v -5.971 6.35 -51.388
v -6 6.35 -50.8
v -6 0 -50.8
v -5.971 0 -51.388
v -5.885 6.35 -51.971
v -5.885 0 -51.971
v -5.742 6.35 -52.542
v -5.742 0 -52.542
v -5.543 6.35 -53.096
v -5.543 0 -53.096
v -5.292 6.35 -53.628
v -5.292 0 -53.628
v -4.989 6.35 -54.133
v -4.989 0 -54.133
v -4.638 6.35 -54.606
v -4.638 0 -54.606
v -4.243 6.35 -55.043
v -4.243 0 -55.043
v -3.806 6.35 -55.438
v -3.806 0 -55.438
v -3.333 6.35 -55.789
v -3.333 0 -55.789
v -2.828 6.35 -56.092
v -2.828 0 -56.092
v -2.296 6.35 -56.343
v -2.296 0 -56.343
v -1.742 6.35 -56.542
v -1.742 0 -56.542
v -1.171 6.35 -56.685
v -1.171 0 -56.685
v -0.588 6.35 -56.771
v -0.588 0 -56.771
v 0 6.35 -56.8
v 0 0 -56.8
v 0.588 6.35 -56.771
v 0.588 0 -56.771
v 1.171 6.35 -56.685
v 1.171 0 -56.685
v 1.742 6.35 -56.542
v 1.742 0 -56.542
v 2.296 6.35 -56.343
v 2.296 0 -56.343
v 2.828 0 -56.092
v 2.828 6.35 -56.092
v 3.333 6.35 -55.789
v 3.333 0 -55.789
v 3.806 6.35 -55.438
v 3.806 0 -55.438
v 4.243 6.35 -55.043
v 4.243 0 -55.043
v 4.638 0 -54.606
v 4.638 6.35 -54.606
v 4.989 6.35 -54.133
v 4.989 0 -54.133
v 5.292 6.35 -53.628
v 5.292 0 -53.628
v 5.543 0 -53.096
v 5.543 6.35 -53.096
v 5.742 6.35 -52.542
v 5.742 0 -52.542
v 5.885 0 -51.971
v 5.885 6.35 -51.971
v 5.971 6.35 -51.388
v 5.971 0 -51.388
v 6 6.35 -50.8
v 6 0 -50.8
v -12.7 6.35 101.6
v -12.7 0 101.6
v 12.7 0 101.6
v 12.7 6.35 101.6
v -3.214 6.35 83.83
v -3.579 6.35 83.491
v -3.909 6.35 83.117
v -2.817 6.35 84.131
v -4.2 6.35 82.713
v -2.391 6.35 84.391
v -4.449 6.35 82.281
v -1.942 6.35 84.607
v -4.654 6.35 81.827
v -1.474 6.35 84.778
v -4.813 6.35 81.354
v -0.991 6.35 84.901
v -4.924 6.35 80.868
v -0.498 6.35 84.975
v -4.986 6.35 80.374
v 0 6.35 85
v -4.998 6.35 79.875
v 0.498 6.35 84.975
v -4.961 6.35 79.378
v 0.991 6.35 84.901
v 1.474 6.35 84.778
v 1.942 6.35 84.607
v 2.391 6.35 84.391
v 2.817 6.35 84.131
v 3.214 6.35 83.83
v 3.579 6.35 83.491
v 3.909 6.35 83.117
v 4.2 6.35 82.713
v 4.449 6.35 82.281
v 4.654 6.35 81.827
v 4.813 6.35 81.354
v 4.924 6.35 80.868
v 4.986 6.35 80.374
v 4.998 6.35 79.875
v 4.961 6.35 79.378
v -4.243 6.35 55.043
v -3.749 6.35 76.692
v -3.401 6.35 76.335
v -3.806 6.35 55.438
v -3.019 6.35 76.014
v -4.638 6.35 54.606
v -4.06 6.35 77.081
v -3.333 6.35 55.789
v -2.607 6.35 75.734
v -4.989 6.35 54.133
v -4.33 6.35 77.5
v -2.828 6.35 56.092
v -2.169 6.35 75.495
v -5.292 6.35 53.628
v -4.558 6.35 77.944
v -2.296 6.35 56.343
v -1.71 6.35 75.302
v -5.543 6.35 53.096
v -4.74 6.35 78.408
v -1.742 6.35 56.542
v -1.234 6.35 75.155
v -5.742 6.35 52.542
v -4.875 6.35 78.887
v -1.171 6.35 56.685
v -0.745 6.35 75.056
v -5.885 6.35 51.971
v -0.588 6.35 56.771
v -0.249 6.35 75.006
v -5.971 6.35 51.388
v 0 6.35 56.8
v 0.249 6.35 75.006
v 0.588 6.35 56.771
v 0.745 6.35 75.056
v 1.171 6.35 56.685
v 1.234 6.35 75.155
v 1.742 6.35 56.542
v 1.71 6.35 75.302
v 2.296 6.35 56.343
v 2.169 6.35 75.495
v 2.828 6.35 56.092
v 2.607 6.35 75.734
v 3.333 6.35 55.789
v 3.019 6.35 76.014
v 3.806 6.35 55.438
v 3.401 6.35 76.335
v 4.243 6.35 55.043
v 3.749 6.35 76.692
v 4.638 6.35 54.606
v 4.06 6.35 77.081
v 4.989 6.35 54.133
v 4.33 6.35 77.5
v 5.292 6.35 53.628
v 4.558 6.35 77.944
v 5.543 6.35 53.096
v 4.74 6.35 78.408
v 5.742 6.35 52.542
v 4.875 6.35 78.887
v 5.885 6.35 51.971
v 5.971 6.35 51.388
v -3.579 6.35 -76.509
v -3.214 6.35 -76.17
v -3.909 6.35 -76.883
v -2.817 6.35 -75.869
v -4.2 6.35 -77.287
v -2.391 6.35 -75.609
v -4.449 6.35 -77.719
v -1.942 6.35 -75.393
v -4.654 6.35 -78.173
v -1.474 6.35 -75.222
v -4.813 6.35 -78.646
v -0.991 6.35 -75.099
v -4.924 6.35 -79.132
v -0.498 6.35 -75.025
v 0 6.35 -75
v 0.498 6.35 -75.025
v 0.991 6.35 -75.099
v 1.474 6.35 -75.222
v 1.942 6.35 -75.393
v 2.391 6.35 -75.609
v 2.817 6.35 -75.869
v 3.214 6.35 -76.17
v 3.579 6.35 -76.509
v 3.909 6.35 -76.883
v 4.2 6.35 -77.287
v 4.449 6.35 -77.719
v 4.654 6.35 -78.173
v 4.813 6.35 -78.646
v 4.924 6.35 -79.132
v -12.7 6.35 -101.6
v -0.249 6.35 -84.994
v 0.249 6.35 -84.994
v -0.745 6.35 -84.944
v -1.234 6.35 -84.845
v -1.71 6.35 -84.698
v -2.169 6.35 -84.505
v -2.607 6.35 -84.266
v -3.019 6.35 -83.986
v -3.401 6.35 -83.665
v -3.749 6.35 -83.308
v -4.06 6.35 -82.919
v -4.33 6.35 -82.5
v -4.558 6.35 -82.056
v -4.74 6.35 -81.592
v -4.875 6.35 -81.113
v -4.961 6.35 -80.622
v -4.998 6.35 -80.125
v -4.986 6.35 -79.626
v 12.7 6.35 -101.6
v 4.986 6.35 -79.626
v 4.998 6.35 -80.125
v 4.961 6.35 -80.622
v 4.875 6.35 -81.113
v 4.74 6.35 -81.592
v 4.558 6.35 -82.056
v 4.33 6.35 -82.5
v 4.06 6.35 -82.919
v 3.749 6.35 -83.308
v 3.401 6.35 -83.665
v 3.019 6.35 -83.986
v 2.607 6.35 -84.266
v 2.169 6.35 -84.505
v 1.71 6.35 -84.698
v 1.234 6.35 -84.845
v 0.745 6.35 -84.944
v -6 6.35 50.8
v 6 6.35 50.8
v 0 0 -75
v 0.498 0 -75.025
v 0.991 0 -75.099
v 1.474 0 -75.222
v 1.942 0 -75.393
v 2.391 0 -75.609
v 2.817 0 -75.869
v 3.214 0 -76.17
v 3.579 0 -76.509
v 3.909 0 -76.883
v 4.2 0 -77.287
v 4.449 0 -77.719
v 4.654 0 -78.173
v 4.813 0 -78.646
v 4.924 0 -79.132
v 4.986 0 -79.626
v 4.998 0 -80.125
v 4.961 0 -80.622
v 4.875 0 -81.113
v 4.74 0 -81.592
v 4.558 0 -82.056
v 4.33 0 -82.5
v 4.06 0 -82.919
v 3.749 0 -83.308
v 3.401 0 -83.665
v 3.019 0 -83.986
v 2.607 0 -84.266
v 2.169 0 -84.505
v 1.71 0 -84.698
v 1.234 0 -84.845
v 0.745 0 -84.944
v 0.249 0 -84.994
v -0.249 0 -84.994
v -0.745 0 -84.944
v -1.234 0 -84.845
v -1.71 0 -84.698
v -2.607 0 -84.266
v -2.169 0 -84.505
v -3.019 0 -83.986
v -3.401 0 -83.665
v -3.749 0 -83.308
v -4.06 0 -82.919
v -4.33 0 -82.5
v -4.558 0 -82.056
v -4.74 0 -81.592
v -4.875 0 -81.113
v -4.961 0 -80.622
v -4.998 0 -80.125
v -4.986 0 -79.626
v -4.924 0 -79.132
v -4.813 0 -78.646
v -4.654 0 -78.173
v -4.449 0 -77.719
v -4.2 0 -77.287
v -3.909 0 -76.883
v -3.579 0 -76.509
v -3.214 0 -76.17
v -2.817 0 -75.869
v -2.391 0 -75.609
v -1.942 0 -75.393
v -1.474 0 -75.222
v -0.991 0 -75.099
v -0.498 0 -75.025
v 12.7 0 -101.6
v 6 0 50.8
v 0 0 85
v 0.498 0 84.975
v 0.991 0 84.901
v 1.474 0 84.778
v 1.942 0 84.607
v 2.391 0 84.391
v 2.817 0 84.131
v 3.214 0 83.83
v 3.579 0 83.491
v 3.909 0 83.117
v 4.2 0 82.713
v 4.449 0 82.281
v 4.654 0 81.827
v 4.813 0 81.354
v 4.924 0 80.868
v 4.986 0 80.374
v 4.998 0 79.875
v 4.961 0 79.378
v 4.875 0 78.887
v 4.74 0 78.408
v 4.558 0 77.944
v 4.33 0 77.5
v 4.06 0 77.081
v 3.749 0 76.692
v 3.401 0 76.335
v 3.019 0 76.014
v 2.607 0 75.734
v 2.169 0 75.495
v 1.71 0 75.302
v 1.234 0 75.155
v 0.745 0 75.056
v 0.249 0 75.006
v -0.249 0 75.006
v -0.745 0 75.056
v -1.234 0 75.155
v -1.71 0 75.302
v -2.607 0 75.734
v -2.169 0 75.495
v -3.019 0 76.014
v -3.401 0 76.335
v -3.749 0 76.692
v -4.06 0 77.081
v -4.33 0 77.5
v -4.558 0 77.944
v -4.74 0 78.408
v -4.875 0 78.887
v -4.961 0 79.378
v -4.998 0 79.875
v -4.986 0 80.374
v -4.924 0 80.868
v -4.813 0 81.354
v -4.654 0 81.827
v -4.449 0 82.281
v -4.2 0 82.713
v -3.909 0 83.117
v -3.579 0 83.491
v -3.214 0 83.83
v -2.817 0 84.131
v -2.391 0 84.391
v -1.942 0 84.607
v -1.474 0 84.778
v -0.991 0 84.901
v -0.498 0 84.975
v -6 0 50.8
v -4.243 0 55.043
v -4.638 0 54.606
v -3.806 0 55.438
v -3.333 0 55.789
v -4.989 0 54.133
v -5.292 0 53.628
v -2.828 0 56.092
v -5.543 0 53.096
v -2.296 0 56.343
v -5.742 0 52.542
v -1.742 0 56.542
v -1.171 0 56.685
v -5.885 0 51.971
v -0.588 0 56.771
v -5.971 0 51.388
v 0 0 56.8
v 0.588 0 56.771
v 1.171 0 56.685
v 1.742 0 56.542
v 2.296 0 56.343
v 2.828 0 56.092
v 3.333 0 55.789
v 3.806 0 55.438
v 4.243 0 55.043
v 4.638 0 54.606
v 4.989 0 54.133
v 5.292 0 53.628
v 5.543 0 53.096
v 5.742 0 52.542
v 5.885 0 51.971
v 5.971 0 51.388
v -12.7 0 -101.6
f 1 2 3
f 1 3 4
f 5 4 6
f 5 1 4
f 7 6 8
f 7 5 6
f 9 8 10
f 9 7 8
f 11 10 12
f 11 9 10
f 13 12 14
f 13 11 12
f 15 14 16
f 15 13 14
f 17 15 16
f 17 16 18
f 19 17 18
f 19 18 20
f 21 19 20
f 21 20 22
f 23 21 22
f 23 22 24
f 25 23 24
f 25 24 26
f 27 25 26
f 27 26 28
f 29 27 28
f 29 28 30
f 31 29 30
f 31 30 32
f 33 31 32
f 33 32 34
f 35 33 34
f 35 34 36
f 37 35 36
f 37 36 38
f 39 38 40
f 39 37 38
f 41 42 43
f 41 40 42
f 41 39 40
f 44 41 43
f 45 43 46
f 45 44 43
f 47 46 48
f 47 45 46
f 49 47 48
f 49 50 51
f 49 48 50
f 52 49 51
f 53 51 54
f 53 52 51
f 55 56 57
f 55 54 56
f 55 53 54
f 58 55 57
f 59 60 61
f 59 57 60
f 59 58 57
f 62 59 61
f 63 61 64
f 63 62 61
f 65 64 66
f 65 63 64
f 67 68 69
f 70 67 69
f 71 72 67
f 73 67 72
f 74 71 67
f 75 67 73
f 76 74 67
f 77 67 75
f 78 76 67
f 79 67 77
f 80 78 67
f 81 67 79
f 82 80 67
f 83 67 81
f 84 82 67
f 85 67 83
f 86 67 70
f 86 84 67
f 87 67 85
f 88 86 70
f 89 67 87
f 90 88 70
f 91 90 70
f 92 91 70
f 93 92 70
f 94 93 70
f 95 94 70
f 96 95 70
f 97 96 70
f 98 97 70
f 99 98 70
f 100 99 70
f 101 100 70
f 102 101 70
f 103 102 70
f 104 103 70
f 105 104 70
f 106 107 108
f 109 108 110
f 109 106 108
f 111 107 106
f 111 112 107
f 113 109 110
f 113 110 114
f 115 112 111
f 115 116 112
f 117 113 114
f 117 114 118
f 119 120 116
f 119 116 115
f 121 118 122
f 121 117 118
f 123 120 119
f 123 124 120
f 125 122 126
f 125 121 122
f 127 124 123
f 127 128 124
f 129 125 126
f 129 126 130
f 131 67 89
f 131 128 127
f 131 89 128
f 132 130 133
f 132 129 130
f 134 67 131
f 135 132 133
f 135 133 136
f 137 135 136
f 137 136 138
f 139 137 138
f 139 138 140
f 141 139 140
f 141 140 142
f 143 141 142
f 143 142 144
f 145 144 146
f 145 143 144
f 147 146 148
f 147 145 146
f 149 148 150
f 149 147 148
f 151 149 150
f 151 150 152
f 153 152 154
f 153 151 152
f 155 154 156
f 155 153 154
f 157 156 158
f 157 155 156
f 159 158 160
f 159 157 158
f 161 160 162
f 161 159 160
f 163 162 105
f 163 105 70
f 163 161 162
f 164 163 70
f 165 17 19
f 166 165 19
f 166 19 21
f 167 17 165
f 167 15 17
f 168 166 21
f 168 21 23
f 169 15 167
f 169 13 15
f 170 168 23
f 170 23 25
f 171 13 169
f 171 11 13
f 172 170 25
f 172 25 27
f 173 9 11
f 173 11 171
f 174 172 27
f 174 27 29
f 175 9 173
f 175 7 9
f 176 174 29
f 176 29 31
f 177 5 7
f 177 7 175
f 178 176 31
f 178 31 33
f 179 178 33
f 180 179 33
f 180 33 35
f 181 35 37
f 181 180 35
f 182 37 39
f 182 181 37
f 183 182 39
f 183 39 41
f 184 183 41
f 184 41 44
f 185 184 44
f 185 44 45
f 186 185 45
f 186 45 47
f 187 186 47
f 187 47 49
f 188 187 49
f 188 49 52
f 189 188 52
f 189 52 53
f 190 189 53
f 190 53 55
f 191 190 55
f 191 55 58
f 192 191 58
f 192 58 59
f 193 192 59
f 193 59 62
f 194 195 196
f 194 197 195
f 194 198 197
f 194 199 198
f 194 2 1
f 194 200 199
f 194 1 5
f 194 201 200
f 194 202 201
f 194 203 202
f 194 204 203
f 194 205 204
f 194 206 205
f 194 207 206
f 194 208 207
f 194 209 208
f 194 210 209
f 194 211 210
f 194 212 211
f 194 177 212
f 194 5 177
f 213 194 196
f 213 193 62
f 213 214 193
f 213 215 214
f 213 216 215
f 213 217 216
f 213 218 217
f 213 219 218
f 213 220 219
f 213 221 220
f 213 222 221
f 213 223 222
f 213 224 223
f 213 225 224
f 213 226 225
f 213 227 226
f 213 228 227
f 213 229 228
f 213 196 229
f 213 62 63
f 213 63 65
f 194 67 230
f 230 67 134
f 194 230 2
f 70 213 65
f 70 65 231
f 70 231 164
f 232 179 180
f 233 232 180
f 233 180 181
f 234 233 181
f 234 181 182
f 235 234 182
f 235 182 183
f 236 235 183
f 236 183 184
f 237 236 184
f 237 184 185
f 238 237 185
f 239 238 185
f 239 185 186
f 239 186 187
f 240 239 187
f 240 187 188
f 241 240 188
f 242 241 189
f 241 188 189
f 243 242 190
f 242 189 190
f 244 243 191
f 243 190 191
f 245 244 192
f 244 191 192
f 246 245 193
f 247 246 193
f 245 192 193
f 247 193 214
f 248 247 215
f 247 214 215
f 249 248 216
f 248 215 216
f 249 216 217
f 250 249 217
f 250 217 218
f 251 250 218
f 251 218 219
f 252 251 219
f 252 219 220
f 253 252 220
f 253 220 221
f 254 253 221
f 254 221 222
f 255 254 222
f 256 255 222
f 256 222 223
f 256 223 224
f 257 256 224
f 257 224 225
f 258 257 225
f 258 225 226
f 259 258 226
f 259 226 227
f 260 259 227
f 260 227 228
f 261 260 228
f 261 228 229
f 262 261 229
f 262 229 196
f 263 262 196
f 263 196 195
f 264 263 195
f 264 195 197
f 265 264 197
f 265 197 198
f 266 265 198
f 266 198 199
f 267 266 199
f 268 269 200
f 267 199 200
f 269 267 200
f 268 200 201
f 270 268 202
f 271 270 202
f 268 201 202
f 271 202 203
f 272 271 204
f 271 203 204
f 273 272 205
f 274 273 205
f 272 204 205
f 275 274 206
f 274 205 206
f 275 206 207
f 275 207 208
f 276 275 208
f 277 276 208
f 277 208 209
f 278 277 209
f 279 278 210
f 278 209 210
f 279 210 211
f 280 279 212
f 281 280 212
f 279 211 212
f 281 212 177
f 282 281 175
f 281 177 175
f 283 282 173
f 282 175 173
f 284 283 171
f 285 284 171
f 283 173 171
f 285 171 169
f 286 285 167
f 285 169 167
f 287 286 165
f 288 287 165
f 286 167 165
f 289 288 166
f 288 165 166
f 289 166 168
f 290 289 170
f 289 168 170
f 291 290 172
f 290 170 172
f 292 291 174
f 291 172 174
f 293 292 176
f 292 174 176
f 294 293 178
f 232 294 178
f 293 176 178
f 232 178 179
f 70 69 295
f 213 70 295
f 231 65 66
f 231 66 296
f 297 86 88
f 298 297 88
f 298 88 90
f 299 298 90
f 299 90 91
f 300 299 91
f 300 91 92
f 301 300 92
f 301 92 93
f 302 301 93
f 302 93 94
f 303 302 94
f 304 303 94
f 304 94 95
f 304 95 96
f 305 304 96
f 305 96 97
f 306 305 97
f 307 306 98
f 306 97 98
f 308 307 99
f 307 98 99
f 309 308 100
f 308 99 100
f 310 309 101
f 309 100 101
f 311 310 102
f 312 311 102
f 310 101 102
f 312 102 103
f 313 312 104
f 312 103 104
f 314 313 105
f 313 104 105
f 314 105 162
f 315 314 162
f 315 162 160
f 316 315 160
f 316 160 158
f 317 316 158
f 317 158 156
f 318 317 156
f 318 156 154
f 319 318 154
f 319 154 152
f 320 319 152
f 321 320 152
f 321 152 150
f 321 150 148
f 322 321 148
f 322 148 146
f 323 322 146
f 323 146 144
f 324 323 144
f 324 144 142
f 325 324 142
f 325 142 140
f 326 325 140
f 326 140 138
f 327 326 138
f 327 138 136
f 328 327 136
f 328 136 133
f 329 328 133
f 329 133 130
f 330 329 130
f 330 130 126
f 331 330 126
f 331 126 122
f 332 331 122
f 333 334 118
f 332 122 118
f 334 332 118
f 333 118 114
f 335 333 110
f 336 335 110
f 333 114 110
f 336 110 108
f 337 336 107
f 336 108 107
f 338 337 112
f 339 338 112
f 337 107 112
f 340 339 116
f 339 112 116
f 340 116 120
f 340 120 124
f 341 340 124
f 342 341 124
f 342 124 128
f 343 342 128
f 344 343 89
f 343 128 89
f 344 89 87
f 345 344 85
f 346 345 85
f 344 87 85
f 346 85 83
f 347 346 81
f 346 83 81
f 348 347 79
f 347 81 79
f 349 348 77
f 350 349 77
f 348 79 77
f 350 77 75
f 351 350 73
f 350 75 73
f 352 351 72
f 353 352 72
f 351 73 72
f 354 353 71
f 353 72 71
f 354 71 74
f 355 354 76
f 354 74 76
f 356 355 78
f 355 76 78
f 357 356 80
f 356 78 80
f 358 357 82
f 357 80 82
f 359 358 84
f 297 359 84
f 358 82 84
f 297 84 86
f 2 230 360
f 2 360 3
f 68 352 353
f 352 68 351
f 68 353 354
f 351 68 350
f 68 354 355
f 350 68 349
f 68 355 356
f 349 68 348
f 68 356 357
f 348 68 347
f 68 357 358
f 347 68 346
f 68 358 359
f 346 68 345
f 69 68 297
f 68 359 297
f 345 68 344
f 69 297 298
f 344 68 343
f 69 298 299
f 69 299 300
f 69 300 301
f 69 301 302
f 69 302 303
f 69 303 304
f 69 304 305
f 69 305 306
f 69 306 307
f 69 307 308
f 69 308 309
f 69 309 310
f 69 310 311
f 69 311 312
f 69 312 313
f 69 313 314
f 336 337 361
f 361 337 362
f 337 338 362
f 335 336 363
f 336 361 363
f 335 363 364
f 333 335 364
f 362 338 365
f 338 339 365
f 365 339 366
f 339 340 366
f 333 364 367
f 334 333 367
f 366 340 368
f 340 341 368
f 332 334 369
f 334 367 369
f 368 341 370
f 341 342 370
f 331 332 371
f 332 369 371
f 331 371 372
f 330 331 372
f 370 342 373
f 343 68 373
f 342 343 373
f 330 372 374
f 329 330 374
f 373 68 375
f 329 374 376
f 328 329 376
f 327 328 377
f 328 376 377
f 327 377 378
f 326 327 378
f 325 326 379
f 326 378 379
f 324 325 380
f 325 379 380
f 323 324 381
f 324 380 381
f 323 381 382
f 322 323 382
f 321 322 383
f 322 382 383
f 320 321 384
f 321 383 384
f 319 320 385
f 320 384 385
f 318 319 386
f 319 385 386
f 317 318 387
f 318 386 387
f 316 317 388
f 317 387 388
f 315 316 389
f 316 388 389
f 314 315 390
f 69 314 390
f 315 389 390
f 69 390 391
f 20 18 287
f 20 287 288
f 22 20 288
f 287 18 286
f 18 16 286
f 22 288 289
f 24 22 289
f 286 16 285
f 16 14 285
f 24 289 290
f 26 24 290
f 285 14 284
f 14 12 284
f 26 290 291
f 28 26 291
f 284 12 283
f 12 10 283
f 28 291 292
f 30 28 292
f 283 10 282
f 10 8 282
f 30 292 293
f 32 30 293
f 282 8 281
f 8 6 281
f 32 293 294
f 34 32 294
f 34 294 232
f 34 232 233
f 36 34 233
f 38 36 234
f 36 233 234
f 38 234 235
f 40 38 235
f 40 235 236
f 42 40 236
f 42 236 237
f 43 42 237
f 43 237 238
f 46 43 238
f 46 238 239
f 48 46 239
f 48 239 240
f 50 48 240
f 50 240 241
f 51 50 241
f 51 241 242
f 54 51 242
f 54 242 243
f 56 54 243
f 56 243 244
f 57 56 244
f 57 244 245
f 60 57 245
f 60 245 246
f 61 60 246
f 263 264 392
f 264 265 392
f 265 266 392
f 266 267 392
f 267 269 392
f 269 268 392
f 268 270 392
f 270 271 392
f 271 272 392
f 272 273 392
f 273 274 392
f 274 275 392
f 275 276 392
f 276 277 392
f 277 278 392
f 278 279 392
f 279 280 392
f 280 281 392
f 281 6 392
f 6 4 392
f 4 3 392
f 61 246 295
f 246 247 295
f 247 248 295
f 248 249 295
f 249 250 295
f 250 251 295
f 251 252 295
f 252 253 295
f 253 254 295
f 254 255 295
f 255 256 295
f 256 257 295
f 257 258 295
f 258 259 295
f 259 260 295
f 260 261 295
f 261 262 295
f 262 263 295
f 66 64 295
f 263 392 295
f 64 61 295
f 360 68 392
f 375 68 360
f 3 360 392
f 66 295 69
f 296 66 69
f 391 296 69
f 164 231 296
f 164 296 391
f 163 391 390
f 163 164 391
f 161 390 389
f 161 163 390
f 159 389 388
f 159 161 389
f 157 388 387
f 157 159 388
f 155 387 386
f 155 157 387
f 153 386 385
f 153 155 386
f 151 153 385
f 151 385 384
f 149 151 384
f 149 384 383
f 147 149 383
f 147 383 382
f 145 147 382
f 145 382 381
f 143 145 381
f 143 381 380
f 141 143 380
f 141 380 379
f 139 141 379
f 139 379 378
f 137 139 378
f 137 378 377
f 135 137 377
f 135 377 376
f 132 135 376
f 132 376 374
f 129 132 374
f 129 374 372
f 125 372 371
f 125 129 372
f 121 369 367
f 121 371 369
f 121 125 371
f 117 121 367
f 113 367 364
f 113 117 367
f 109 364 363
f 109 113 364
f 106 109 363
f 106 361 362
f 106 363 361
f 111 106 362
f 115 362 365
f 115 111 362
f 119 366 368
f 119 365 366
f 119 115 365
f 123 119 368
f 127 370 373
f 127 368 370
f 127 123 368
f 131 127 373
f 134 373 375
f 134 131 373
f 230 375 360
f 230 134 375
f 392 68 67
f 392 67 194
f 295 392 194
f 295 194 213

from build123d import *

# Parameters (mm, degrees)
SKETCH1_W           = 25.4
SKETCH1_H           = 203.2
BOSS_EXTRUDE1_DEPTH = 6.35
SKETCH2_R           = 5
CUT_EXTRUDE1_DEPTH  = 103.587389576
CUT_EXTRUDE2_DEPTH  = 103.587389576


with BuildPart() as part:
    # Sketch1 → Boss-Extrude1 (new body)
    with BuildSketch(Plane(origin=(0, 0, 0), x_dir=(1, 0, 0), z_dir=(0, 1, 0))):
        Rectangle(SKETCH1_W, SKETCH1_H)
    extrude(amount=BOSS_EXTRUDE1_DEPTH)

    # Sketch2 → Cut-Extrude1 (cut, through all)
    with BuildSketch(Plane(origin=(0, 6.35, 0), x_dir=(1, 0, 0), z_dir=(0, 1, 0))):
        with Locations(Location((0, -80, 0), (0, 0, 270))):
            Circle(SKETCH2_R)
        with Locations(Location((0, 80, 0), (0, 0, 270))):
            Circle(SKETCH2_R)
    extrude(amount=-CUT_EXTRUDE1_DEPTH, mode=Mode.SUBTRACT)

    # Sketch3 → Cut-Extrude2 (cut, through all)
    with BuildSketch(Plane(origin=(0, 6.35, 0), x_dir=(1, 0, 0), z_dir=(0, 1, 0))):
        with BuildLine():
            Line((6, 50.8), (6, -50.8))
            ThreePointArc((6, -50.8), (0, -56.8), (-6, -50.8))
            Line((-6, -50.8), (-6, 50.8))
            ThreePointArc((-6, 50.8), (0, 56.8), (6, 50.8))
        make_face()
    extrude(amount=-CUT_EXTRUDE2_DEPTH, mode=Mode.SUBTRACT)


solid = part.part
